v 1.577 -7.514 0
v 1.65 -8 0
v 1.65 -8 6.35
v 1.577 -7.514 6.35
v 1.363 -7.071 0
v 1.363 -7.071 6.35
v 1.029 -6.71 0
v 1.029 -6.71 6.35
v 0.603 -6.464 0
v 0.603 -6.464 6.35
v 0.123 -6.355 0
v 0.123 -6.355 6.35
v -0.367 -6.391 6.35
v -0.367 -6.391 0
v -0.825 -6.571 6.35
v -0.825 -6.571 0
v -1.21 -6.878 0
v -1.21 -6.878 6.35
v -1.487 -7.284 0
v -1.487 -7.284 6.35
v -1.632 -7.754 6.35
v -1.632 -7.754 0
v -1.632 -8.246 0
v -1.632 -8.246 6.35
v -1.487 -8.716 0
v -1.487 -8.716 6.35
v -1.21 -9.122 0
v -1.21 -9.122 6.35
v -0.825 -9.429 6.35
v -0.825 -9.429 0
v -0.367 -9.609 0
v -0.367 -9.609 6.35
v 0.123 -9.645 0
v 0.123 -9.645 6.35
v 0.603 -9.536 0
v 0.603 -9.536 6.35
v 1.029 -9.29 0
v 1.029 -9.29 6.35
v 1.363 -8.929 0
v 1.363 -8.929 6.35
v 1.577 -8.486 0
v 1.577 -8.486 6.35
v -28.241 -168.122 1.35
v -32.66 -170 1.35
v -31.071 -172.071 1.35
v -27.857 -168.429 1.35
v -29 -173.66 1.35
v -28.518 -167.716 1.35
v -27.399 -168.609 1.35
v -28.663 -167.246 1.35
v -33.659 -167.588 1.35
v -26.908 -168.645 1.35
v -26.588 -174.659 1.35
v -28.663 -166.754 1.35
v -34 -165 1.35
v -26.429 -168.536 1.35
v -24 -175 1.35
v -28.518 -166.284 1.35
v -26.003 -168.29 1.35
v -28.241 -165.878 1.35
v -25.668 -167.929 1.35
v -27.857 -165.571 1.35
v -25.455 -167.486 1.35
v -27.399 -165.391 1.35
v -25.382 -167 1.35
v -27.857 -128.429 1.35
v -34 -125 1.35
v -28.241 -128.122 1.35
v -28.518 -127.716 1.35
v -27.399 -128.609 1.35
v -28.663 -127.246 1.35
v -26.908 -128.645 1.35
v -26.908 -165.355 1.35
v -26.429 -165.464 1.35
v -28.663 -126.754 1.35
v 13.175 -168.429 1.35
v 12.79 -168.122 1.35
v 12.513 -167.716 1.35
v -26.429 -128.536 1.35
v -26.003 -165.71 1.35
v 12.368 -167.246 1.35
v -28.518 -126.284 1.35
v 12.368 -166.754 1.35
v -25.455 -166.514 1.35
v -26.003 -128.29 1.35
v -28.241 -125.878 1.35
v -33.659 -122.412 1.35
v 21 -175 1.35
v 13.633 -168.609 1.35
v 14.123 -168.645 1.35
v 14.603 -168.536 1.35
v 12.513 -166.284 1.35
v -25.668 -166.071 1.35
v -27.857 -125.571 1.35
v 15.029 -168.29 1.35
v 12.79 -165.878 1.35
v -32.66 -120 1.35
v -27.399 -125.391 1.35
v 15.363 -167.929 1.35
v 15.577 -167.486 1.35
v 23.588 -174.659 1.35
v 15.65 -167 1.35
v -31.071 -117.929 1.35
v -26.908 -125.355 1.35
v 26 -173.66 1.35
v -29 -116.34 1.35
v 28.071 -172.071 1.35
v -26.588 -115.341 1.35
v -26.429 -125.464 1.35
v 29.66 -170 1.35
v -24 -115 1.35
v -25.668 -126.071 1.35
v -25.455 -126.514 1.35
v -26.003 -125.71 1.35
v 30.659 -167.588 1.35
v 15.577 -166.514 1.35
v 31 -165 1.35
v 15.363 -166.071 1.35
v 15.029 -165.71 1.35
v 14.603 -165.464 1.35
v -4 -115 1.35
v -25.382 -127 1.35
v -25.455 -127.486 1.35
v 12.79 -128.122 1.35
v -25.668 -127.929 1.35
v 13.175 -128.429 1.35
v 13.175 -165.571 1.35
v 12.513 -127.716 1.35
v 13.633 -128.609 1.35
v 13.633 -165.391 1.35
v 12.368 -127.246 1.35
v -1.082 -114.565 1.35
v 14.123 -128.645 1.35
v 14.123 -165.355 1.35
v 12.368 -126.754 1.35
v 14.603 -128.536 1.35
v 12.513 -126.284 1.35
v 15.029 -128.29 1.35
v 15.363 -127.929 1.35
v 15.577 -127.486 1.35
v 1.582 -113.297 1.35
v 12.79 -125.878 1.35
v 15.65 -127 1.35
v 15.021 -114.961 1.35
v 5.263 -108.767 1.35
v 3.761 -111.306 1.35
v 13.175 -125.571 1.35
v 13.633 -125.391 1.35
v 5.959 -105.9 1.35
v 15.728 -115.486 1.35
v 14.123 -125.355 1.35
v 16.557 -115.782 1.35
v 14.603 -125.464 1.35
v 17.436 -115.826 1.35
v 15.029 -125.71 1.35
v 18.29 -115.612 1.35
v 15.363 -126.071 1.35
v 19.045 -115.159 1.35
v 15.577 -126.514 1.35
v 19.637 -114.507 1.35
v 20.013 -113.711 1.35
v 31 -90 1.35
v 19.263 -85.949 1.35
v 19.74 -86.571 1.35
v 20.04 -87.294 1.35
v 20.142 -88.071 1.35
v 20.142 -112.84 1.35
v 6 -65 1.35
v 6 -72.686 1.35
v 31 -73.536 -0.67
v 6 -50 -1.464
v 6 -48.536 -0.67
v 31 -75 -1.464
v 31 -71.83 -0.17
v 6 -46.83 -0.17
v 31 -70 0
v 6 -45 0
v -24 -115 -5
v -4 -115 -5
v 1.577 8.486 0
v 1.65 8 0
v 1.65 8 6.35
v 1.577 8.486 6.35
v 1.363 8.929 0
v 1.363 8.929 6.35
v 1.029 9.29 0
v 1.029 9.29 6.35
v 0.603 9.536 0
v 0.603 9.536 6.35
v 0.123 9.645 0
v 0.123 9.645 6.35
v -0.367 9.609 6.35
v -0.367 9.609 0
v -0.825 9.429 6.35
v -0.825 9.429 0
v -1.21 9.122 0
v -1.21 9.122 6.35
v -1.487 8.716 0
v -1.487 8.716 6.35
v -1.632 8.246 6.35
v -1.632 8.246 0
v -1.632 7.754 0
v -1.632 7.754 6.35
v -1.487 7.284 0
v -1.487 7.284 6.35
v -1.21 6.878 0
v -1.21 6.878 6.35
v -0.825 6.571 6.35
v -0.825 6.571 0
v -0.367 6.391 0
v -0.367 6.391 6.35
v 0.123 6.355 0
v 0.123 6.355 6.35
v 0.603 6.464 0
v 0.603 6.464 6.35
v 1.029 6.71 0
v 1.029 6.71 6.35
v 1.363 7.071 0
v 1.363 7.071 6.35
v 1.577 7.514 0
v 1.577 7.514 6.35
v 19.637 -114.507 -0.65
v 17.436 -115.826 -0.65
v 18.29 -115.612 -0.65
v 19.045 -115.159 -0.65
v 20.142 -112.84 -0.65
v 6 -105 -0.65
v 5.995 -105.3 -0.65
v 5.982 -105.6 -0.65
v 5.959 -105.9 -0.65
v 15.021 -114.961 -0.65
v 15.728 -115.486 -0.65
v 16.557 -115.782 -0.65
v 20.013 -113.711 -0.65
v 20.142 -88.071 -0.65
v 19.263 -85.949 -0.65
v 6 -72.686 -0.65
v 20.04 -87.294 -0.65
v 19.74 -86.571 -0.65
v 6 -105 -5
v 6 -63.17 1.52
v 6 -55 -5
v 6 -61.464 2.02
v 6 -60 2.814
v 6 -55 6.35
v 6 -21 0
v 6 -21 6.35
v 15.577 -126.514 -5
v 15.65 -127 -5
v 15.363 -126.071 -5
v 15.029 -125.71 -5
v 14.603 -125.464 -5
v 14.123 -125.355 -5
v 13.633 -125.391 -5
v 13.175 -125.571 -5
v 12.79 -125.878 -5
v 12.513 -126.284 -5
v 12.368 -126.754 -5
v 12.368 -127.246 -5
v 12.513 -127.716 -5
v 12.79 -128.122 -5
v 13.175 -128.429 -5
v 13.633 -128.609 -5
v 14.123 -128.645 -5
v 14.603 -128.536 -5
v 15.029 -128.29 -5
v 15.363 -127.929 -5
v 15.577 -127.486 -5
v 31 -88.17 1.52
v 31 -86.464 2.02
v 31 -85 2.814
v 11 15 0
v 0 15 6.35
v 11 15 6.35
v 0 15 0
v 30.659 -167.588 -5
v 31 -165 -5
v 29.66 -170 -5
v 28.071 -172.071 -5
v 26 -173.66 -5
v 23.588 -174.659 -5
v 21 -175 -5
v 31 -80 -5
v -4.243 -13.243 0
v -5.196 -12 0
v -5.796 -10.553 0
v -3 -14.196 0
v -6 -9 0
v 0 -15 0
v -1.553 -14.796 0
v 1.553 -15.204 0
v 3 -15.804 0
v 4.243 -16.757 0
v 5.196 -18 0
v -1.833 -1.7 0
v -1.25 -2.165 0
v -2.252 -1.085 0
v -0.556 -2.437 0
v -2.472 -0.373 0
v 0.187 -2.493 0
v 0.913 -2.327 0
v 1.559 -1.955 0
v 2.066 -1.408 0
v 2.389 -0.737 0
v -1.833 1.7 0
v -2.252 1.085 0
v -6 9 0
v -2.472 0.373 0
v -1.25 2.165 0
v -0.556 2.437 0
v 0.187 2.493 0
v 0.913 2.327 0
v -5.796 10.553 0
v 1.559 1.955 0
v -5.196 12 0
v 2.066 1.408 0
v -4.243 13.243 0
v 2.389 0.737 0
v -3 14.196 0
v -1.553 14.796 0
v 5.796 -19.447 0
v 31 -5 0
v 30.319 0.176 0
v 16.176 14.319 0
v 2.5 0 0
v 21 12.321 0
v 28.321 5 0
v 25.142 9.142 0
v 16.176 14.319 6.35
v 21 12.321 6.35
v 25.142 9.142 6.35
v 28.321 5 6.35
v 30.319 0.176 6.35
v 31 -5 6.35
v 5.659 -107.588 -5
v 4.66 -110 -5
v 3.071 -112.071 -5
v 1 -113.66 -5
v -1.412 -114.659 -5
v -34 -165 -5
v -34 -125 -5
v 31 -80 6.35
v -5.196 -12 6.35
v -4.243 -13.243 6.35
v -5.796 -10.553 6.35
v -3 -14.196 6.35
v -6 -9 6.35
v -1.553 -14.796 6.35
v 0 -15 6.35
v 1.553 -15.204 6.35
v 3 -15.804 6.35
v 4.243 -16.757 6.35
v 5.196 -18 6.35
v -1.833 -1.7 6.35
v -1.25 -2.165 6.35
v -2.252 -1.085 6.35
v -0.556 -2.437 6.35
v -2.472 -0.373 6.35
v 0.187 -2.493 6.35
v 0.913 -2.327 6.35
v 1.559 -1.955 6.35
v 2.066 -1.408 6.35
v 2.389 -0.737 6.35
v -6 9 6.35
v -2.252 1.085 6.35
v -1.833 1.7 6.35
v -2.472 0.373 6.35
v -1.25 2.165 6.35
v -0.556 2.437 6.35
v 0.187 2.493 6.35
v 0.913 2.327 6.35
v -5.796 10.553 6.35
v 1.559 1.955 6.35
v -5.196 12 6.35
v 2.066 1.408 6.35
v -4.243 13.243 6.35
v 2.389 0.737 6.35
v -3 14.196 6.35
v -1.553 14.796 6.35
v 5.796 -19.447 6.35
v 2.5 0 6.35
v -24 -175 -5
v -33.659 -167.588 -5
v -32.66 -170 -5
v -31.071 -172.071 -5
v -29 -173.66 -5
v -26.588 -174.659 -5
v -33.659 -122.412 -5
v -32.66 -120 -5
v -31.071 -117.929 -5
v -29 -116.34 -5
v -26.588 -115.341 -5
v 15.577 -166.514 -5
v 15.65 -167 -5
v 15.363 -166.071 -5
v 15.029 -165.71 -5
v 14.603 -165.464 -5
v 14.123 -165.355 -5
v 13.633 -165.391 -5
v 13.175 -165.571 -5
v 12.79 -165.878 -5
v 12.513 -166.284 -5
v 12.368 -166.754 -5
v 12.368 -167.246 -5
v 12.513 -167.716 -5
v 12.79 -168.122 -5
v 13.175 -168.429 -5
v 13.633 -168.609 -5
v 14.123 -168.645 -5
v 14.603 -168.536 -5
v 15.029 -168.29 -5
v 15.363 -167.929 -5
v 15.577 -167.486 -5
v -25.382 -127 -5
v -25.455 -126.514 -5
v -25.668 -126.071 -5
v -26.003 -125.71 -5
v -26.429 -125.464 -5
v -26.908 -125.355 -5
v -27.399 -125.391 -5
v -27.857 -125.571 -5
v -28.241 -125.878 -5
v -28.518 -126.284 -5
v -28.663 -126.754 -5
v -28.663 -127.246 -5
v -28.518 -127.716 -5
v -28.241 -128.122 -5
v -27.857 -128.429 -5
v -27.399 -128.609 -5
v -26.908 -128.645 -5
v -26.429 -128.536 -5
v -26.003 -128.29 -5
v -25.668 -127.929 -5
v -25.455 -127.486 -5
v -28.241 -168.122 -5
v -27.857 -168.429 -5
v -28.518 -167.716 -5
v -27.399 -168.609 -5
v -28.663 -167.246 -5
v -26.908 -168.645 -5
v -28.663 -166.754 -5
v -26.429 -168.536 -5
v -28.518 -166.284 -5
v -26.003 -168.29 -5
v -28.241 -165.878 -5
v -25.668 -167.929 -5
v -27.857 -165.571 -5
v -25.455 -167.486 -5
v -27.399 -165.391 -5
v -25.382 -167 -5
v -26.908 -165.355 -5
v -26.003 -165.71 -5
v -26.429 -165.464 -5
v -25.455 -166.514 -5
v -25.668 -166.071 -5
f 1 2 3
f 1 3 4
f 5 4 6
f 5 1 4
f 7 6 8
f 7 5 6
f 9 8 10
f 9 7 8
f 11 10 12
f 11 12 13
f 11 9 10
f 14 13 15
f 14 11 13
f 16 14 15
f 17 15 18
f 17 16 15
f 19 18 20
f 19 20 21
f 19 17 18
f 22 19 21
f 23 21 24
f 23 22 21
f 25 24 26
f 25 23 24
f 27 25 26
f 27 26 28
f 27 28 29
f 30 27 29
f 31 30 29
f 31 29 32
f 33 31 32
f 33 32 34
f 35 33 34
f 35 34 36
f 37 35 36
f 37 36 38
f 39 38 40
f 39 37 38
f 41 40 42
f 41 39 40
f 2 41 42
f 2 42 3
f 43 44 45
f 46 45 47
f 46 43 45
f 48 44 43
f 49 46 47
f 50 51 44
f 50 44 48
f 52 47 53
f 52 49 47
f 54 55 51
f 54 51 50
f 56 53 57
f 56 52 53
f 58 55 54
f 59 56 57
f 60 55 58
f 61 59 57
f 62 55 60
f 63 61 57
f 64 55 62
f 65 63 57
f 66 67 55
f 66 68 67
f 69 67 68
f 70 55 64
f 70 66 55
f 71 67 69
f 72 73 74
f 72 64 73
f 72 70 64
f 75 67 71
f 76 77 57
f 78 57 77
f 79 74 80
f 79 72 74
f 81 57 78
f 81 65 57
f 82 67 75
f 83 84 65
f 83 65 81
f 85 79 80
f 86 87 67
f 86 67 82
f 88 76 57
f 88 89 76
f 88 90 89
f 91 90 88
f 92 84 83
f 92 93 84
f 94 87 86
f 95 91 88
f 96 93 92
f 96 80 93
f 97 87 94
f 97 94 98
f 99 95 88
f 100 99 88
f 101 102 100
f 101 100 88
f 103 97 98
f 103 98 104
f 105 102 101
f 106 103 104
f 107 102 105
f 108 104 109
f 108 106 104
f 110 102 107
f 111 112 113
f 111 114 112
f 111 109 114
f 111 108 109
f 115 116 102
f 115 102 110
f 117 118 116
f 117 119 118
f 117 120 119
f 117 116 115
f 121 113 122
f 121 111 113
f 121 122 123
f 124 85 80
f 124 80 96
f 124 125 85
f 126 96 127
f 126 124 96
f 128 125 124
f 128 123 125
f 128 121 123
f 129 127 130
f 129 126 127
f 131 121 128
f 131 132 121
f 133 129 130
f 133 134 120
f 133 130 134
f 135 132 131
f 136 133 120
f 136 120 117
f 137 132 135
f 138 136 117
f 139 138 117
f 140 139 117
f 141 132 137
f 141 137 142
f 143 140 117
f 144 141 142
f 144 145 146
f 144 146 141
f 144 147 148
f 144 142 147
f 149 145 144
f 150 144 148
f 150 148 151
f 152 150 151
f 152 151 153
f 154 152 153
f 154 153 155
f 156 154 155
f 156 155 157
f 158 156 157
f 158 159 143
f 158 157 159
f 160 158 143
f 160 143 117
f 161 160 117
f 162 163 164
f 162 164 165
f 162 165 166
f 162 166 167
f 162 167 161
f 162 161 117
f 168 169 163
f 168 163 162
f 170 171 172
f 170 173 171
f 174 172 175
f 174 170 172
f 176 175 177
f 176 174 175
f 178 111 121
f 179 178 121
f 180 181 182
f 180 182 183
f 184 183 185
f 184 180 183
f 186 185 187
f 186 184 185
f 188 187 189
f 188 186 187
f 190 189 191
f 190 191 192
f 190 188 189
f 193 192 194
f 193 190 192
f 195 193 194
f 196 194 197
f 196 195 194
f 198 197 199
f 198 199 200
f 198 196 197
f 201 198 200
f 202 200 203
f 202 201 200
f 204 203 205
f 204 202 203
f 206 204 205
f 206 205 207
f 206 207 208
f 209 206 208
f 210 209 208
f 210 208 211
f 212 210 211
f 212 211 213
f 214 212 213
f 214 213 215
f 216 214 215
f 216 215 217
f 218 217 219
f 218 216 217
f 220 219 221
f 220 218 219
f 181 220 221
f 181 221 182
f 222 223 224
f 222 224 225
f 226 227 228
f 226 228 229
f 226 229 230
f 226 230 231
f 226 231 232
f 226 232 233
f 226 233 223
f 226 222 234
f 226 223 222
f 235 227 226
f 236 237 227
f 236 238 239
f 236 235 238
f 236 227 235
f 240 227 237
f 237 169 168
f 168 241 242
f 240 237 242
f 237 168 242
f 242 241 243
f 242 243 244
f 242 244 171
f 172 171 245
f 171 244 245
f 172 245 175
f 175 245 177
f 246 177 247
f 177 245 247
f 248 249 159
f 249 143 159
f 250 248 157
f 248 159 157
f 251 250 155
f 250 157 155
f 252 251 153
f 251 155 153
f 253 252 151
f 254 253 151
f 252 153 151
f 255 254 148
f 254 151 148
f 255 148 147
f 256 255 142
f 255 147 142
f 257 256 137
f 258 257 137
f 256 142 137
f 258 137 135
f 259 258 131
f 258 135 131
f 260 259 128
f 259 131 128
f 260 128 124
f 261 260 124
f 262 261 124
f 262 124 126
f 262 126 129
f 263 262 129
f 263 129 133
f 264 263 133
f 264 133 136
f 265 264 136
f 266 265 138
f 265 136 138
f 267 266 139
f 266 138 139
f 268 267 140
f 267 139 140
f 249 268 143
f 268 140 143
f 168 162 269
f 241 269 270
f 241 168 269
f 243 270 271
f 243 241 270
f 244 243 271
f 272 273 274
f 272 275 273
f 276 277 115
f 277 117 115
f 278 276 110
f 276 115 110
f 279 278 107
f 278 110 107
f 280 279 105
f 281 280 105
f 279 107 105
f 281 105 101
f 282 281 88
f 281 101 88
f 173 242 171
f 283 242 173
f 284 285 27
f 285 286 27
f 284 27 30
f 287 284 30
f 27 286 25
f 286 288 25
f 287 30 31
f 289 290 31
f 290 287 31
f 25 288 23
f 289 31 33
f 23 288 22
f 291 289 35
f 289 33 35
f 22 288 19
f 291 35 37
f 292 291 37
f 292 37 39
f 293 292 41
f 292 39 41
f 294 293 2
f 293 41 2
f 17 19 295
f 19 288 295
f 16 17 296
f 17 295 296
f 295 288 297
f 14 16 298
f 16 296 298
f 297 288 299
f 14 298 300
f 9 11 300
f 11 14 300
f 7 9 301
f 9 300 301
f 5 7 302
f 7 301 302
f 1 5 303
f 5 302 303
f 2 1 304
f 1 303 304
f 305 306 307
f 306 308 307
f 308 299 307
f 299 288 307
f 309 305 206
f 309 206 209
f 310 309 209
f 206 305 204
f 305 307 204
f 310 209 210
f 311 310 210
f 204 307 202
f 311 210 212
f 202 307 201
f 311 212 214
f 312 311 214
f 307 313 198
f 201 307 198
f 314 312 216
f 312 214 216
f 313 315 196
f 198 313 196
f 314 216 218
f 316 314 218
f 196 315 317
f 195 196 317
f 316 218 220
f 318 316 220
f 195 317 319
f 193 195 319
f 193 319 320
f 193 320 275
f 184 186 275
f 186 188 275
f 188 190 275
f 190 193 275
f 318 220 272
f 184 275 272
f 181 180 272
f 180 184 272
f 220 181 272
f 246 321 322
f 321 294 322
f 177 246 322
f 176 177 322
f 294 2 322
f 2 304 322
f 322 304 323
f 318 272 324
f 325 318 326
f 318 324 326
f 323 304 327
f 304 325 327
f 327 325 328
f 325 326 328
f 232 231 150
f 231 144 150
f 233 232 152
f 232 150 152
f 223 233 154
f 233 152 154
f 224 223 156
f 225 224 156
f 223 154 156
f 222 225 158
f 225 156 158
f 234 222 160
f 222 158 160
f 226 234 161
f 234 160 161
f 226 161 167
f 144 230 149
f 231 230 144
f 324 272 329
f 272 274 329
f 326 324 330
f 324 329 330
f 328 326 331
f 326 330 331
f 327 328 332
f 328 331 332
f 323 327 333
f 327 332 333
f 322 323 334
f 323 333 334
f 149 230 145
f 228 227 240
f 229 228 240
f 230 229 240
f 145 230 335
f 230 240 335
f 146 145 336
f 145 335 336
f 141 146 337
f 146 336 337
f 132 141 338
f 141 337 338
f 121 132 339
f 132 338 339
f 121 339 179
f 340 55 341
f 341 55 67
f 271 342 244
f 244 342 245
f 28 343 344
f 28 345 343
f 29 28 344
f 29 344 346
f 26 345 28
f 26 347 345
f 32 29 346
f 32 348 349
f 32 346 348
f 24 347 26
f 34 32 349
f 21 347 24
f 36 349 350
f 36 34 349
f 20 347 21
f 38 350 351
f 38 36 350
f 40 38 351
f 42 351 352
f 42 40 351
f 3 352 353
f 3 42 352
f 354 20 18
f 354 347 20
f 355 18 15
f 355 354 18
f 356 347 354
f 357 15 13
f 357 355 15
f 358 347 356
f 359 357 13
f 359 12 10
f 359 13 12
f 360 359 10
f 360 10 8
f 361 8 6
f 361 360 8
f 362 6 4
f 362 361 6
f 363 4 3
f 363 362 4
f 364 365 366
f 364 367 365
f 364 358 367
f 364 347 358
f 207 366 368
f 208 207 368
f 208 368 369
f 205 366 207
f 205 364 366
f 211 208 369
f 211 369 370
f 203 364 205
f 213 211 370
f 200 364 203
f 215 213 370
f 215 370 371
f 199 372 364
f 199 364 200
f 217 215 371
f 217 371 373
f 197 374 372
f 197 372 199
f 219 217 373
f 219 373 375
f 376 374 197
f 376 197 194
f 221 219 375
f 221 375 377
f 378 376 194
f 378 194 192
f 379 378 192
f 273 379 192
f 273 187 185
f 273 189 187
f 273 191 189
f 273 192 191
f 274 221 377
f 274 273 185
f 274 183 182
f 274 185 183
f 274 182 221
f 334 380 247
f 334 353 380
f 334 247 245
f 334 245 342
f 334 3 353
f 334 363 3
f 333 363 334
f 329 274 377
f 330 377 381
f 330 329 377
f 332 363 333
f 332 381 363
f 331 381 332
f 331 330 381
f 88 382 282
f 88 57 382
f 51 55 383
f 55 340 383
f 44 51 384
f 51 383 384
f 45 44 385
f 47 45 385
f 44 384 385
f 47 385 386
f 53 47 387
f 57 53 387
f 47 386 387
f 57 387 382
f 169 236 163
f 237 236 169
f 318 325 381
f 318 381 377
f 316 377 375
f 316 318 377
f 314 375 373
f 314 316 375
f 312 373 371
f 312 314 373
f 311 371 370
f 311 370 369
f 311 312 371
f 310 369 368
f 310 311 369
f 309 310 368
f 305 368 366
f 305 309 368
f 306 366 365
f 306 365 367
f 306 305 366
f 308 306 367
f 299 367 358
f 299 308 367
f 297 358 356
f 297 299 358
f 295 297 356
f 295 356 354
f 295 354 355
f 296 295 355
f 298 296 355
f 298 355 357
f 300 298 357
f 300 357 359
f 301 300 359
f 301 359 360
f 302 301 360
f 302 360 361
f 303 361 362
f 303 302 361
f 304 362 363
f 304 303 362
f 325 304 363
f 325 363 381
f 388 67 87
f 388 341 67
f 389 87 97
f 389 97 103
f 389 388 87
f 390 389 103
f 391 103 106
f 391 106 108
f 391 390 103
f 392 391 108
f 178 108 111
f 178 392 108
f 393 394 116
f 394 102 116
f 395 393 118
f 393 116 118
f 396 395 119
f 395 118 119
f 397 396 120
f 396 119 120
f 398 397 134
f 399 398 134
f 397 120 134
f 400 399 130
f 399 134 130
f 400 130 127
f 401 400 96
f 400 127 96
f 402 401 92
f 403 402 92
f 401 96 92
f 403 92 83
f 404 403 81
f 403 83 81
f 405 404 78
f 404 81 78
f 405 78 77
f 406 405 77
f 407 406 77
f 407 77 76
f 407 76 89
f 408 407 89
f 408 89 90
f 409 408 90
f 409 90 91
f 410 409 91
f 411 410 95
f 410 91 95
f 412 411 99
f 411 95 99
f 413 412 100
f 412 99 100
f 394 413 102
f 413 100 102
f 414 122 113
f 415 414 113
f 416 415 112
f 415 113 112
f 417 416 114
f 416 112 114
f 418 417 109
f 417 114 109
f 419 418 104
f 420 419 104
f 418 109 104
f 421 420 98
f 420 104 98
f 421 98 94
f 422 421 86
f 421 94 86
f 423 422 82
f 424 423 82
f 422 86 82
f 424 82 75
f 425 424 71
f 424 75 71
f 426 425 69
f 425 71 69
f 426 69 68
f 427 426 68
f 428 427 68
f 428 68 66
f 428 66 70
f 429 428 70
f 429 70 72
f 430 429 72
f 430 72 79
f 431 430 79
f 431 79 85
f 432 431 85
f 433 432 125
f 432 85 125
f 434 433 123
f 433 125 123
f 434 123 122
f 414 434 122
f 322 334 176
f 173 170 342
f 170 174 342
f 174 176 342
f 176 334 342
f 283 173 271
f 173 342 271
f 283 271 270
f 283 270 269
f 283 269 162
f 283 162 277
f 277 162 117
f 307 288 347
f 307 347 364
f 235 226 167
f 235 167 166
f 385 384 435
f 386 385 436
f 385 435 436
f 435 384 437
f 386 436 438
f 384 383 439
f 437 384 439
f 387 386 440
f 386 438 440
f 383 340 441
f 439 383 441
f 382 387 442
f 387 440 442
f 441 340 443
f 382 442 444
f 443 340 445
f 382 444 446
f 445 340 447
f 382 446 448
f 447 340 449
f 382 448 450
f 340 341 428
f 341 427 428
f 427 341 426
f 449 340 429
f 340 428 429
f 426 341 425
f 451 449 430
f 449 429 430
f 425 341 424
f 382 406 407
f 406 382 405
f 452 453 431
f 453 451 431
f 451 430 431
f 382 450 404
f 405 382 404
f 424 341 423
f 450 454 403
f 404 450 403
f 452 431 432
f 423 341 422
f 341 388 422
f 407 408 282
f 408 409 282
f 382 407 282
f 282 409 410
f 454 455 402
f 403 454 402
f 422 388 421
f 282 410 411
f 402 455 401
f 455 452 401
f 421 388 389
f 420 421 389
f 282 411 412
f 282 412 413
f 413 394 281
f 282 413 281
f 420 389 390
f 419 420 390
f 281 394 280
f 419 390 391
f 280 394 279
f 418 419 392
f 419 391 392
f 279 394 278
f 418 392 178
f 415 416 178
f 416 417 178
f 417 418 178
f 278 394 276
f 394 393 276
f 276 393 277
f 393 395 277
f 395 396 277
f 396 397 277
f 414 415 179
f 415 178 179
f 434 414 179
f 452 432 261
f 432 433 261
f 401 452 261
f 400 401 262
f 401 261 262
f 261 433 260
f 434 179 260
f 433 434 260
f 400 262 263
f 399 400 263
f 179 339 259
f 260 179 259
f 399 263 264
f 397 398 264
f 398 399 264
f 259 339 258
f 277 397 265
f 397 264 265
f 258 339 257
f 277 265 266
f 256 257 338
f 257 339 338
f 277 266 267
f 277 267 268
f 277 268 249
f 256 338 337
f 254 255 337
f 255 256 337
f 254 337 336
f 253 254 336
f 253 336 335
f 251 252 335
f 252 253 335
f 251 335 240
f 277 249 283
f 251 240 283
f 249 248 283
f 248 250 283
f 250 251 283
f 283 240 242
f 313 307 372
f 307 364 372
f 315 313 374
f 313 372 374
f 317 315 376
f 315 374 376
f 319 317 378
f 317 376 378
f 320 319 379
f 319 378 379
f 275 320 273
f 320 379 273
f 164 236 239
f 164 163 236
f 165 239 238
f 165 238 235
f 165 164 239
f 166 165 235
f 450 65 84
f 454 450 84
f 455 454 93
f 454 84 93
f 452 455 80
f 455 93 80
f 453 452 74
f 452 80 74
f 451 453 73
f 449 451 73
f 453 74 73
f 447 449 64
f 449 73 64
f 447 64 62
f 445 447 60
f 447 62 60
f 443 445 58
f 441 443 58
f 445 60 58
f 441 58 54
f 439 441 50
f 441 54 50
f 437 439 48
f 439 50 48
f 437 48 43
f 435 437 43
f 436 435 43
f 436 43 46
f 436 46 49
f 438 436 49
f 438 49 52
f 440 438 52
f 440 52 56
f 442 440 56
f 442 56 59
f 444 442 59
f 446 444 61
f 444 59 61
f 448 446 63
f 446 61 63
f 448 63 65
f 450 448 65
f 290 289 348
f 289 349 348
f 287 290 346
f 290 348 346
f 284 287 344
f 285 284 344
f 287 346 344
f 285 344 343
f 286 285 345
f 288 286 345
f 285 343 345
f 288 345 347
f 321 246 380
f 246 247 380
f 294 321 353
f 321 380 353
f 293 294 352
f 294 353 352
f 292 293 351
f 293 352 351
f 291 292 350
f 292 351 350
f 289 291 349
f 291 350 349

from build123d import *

# Parameters (mm, degrees)
SKETCH1_W               = 12
SKETCH1_H               = 30
SKETCH1_R               = 1.65
SKETCH1_R_2             = 2.5
BOSS_EXTRUDE1_DEPTH     = 6.35
FILLET1_R               = 6
FILLET2_R               = 6
FILLET3_R               = 20
SKETCH2_R               = 1.65
CUT_EXTRUDE1_DEPTH      = 10
CUT_EXTRUDE3_DEPTH      = 5
BOSS_EXTRUDE3_DEPTH     = 5
CHAMFER2_SIZE           = 5
FILLET5_R               = 5
SKETCH6_R               = 1.65
CUT_EXTRUDE4_DEPTH      = 178.83791075
CUT_EXTRUDE5_DEPTH      = 178.83791075
CUT_EXTRUDE5_DEPTH_BACK = 2
FILLET6_R               = 3
SKETCH8_W               = 40
SKETCH8_H               = 60
SKETCH8_R               = 1.65
BOSS_EXTRUDE4_DEPTH     = 6.35
FILLET7_R               = 10


with BuildPart() as part:
    # Sketch1 → Boss-Extrude1 (new body)
    # profile 1 of 2: a face of its own
    with BuildSketch(Plane.XY):
        Polygon((6, 15), (6, -15), (6, -175), (31, -175), (31, 15), align=None)
    # profile 2 of 2: a face of its own
    with BuildSketch(Plane.XY):
        Rectangle(SKETCH1_W, SKETCH1_H)
        with Locations((0, -8)):
            Circle(SKETCH1_R, mode=Mode.SUBTRACT)
        Circle(SKETCH1_R_2, mode=Mode.SUBTRACT)
        with Locations((0, 8)):
            Circle(SKETCH1_R, mode=Mode.SUBTRACT)
    extrude(amount=BOSS_EXTRUDE1_DEPTH)

    # Fillet1
    fillet1_edges = [part.edges().sort_by_distance(p)[0] for p in [
        (6, -15, 3.175),
    ]]
    fillet(fillet1_edges, radius=FILLET1_R)
    fillet1_2_edges = [part.edges().sort_by_distance(p)[0] for p in [
        (-6, -15, 3.175),
    ]]
    fillet(fillet1_2_edges, radius=FILLET1_R - 0.0001)  # a hair under: the kernel refuses the full size

    # Fillet2
    fillet2_edges = [part.edges().sort_by_distance(p)[0] for p in [
        (-6, 15, 3.175),
    ]]
    fillet(fillet2_edges, radius=FILLET2_R)

    # Fillet3
    fillet3_edges = [part.edges().sort_by_distance(p)[0] for p in [
        (31, 15, 3.175),
    ]]
    fillet(fillet3_edges, radius=FILLET3_R)

    # Sketch2 → Cut-Extrude1 (cut)
    with BuildSketch(Plane.XY.offset(6.35)):
        with Locations((14, -167)):
            Circle(SKETCH2_R)
        with Locations((14, -127)):
            Circle(SKETCH2_R)
    extrude(amount=-CUT_EXTRUDE1_DEPTH, mode=Mode.SUBTRACT)

    # Sketch3 → Cut-Extrude3 (cut)
    with BuildSketch(Plane.XY.offset(6.35)):
        Polygon((31, -175), (31, -80), (6, -55), (6, -175), align=None)
    extrude(amount=-CUT_EXTRUDE3_DEPTH, mode=Mode.SUBTRACT)

    # Sketch5 → Boss-Extrude3 (add)
    with BuildSketch(Plane(origin=(0, 0, 0), x_dir=(-1, 0, 0), z_dir=(0, 0, -1))):
        Polygon((-6, -175), (-6, -55), (-31, -80), (-31, -175), align=None)
    extrude(amount=BOSS_EXTRUDE3_DEPTH)

    # Chamfer2
    chamfer2_edges = [part.edges().sort_by_distance(p)[0] for p in [
        (18.5, -67.5, 1.35),
        (18.5, -67.5, 0),
    ]]
    chamfer(chamfer2_edges, length=CHAMFER2_SIZE - 0.0001)  # a hair under: the kernel refuses the full size

    # Fillet5
    fillet5_edges = [part.edges().sort_by_distance(p)[0] for p in [
        (18.5, -74.570926391, 1.35),
        (18.5, -60.429073609, 0),
    ]]
    fillet(fillet5_edges, radius=FILLET5_R)

    # Sketch6 → Cut-Extrude4 (cut, through all)
    with BuildSketch(Plane.XY.offset(1.35)):
        with Locations((14, -127)):
            Circle(SKETCH6_R)
        with Locations((14, -167)):
            Circle(SKETCH6_R)
    extrude(amount=-CUT_EXTRUDE4_DEPTH, mode=Mode.SUBTRACT)

    # Sketch7 → Cut-Extrude5 (cut, two sides: drawn at the far end of the back side and taken through both)
    with BuildSketch(Plane.XY.offset(1.35).offset(-CUT_EXTRUDE5_DEPTH_BACK)):
        Polygon((-175.7227113, 75.782237154), (6, -105.940474145), (20.142135624, -120.082609769), (20.142135624, -86.828079155), (6, -72.685943532), (-175.7227113, 109.036767768), (-689.712157123, 109.036767768), (-689.712157123, 75.782237154), align=None)
    extrude(amount=CUT_EXTRUDE5_DEPTH + CUT_EXTRUDE5_DEPTH_BACK, mode=Mode.SUBTRACT)

    # Fillet6
    fillet6_edges = [part.edges().sort_by_distance(p)[0] for p in [
        (20.142135624, -86.828079155, 0.35),
        (20.142135624, -120.082609769, 0.35),
    ]]
    fillet(fillet6_edges, radius=FILLET6_R)

    # Sketch8 → Boss-Extrude4 (add)
    with BuildSketch(Plane.XY.offset(1.35)):
        with Locations((-14, -145)):
            Rectangle(SKETCH8_W, SKETCH8_H)
        with Locations((-27.03159011, -127)):
            Circle(SKETCH8_R, mode=Mode.SUBTRACT)
        with Locations((-27.03159011, -167)):
            Circle(SKETCH8_R, mode=Mode.SUBTRACT)
    extrude(amount=-BOSS_EXTRUDE4_DEPTH)

    # Fillet7
    fillet7_edges = [part.edges().sort_by_distance(p)[0] for p in [
        (6, -115, -1.825),
        (31, -175, -1.825),
        (-34, -175, -1.825),
        (-34, -115, -1.825),
    ]]
    fillet(fillet7_edges, radius=FILLET7_R)


solid = part.part
